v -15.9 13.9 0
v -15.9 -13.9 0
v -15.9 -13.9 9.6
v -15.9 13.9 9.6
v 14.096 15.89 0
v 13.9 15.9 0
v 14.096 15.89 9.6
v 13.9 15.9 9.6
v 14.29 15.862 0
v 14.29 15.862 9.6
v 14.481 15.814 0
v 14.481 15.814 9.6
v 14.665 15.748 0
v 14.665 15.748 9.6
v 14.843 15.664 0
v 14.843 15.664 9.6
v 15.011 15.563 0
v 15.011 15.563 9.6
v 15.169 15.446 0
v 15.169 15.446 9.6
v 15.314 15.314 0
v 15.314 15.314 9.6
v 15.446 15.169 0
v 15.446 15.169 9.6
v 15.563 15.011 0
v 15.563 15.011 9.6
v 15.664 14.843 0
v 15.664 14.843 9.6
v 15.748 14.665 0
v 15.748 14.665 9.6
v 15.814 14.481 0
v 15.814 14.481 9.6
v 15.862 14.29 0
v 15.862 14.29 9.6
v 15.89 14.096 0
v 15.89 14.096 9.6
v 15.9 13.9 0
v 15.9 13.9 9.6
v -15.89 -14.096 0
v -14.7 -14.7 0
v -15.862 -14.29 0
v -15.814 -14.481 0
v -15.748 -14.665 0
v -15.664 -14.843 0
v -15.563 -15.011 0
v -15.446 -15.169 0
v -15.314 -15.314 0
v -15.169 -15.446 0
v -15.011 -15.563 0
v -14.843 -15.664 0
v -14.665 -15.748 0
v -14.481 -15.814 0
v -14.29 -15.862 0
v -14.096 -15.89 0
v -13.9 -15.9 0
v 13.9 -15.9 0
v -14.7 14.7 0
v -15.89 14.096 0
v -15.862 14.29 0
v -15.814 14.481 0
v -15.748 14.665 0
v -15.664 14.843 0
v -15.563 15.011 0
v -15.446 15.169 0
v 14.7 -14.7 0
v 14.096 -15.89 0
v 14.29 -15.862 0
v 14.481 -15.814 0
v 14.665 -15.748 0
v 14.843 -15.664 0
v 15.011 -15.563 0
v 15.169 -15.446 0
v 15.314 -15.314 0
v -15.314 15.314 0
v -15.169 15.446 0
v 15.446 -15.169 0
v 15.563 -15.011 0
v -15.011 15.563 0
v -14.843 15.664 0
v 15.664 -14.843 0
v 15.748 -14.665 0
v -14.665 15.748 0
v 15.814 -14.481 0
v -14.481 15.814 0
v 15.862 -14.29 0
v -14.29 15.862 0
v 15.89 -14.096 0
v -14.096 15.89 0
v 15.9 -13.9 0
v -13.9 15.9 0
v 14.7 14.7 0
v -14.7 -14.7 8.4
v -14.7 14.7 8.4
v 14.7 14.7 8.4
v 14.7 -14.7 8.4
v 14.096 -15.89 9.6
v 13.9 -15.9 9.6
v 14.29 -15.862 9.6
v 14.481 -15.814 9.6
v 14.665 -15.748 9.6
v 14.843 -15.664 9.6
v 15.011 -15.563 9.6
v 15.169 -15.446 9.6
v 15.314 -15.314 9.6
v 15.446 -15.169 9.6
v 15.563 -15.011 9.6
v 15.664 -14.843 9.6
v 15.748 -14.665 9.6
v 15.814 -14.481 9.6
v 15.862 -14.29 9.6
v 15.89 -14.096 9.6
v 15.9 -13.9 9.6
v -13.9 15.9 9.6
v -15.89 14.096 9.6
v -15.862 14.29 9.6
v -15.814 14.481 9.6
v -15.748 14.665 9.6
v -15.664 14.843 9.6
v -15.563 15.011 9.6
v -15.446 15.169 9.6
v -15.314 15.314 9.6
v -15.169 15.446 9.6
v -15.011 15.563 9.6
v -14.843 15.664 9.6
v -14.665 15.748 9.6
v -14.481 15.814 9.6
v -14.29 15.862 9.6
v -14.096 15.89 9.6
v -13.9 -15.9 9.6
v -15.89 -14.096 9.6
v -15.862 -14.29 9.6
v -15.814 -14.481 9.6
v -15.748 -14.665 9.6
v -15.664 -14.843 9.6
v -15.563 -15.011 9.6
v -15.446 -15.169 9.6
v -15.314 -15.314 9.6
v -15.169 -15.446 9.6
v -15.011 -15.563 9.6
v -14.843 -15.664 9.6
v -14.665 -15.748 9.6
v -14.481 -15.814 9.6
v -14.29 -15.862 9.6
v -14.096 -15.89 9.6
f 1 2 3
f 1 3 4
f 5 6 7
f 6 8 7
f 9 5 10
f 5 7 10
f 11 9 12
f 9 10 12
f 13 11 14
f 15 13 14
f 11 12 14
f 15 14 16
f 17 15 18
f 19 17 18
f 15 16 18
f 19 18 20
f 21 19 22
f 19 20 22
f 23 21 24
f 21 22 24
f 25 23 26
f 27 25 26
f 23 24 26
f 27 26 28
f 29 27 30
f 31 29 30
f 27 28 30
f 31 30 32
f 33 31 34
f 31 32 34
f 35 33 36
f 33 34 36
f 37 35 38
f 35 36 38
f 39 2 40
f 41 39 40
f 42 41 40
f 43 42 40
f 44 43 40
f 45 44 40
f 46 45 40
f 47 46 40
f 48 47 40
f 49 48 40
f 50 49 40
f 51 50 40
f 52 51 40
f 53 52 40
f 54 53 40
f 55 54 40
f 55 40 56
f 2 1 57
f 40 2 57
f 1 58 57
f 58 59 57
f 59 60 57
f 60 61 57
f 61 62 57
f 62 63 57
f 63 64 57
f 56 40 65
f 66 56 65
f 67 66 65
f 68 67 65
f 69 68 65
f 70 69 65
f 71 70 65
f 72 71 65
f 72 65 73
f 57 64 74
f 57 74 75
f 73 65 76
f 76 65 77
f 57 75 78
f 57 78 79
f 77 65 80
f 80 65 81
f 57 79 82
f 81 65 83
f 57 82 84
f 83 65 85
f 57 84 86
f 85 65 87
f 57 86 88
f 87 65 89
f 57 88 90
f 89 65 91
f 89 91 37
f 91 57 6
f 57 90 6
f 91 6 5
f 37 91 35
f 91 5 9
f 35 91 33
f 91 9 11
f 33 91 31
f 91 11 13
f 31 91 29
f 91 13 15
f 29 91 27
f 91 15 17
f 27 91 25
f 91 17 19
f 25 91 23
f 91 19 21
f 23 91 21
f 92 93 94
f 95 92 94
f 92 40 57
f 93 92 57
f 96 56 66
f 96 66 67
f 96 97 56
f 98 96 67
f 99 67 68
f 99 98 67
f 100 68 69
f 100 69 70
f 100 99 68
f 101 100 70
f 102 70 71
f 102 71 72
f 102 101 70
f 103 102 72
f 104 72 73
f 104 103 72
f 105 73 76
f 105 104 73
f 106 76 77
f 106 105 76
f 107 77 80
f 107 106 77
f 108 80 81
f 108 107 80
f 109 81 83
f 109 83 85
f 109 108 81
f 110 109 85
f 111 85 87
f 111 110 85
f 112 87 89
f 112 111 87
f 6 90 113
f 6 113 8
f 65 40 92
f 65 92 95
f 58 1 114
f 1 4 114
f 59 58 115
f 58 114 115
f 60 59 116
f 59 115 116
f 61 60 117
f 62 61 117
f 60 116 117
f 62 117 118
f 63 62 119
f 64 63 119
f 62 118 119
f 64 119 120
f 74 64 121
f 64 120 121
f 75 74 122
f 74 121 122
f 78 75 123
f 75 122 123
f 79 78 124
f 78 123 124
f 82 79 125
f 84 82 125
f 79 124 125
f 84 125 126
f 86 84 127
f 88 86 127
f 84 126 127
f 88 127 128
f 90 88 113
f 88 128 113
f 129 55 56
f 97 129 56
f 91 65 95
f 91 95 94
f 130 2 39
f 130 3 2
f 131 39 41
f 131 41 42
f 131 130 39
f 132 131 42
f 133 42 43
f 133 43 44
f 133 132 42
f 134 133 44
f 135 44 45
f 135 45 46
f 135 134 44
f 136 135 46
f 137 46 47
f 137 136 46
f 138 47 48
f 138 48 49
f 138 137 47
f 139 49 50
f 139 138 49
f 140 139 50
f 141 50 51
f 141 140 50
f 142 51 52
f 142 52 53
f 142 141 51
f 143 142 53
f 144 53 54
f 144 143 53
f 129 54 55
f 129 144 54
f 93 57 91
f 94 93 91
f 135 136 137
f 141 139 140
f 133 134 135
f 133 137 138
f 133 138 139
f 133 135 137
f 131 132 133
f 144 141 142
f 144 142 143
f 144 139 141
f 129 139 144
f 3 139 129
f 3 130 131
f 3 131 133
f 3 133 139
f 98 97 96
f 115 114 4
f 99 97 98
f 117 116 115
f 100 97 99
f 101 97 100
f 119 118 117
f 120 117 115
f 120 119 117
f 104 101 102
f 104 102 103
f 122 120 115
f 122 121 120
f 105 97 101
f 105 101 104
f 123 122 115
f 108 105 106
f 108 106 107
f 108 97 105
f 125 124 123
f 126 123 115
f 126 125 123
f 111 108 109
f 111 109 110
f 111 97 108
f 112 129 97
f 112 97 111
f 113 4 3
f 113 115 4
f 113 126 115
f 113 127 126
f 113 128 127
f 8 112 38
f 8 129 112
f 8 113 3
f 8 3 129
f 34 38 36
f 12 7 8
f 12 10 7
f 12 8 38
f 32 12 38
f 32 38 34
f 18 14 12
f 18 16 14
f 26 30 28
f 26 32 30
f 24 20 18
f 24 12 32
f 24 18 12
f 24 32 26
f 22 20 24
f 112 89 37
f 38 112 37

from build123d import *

# Parameters (mm, degrees)
F0_W     = 31.8
F0_H     = 31.8
F1_DEPTH = 9.6
F2_W     = 29.4
F2_H     = 29.4
F3_DEPTH = 8.4
F4_R     = 2


# Not quite as in the source:
# - a feature names something its author has since deleted; it is built from what else it names


with BuildPart() as f1:
    # F0 (on Top) → F1 (new body)
    with BuildSketch(Plane.XY):
        Rectangle(F0_W, F0_H)
    extrude(amount=F1_DEPTH)

    # F2 (on Top) → F3 (cut)
    with BuildSketch(Plane.XY):
        Rectangle(F2_W, F2_H)
    extrude(amount=F3_DEPTH, mode=Mode.SUBTRACT)

    # F4
    f4_edges = [f1.edges().sort_by_distance(p)[0] for p in [
        (-15.9, -15.9, 4.8),
        (-15.9, 15.9, 4.8),
        (15.9, 15.9, 4.8),
        (15.9, -15.9, 4.8),
    ]]
    fillet(f4_edges, radius=F4_R)


solid = f1.part
